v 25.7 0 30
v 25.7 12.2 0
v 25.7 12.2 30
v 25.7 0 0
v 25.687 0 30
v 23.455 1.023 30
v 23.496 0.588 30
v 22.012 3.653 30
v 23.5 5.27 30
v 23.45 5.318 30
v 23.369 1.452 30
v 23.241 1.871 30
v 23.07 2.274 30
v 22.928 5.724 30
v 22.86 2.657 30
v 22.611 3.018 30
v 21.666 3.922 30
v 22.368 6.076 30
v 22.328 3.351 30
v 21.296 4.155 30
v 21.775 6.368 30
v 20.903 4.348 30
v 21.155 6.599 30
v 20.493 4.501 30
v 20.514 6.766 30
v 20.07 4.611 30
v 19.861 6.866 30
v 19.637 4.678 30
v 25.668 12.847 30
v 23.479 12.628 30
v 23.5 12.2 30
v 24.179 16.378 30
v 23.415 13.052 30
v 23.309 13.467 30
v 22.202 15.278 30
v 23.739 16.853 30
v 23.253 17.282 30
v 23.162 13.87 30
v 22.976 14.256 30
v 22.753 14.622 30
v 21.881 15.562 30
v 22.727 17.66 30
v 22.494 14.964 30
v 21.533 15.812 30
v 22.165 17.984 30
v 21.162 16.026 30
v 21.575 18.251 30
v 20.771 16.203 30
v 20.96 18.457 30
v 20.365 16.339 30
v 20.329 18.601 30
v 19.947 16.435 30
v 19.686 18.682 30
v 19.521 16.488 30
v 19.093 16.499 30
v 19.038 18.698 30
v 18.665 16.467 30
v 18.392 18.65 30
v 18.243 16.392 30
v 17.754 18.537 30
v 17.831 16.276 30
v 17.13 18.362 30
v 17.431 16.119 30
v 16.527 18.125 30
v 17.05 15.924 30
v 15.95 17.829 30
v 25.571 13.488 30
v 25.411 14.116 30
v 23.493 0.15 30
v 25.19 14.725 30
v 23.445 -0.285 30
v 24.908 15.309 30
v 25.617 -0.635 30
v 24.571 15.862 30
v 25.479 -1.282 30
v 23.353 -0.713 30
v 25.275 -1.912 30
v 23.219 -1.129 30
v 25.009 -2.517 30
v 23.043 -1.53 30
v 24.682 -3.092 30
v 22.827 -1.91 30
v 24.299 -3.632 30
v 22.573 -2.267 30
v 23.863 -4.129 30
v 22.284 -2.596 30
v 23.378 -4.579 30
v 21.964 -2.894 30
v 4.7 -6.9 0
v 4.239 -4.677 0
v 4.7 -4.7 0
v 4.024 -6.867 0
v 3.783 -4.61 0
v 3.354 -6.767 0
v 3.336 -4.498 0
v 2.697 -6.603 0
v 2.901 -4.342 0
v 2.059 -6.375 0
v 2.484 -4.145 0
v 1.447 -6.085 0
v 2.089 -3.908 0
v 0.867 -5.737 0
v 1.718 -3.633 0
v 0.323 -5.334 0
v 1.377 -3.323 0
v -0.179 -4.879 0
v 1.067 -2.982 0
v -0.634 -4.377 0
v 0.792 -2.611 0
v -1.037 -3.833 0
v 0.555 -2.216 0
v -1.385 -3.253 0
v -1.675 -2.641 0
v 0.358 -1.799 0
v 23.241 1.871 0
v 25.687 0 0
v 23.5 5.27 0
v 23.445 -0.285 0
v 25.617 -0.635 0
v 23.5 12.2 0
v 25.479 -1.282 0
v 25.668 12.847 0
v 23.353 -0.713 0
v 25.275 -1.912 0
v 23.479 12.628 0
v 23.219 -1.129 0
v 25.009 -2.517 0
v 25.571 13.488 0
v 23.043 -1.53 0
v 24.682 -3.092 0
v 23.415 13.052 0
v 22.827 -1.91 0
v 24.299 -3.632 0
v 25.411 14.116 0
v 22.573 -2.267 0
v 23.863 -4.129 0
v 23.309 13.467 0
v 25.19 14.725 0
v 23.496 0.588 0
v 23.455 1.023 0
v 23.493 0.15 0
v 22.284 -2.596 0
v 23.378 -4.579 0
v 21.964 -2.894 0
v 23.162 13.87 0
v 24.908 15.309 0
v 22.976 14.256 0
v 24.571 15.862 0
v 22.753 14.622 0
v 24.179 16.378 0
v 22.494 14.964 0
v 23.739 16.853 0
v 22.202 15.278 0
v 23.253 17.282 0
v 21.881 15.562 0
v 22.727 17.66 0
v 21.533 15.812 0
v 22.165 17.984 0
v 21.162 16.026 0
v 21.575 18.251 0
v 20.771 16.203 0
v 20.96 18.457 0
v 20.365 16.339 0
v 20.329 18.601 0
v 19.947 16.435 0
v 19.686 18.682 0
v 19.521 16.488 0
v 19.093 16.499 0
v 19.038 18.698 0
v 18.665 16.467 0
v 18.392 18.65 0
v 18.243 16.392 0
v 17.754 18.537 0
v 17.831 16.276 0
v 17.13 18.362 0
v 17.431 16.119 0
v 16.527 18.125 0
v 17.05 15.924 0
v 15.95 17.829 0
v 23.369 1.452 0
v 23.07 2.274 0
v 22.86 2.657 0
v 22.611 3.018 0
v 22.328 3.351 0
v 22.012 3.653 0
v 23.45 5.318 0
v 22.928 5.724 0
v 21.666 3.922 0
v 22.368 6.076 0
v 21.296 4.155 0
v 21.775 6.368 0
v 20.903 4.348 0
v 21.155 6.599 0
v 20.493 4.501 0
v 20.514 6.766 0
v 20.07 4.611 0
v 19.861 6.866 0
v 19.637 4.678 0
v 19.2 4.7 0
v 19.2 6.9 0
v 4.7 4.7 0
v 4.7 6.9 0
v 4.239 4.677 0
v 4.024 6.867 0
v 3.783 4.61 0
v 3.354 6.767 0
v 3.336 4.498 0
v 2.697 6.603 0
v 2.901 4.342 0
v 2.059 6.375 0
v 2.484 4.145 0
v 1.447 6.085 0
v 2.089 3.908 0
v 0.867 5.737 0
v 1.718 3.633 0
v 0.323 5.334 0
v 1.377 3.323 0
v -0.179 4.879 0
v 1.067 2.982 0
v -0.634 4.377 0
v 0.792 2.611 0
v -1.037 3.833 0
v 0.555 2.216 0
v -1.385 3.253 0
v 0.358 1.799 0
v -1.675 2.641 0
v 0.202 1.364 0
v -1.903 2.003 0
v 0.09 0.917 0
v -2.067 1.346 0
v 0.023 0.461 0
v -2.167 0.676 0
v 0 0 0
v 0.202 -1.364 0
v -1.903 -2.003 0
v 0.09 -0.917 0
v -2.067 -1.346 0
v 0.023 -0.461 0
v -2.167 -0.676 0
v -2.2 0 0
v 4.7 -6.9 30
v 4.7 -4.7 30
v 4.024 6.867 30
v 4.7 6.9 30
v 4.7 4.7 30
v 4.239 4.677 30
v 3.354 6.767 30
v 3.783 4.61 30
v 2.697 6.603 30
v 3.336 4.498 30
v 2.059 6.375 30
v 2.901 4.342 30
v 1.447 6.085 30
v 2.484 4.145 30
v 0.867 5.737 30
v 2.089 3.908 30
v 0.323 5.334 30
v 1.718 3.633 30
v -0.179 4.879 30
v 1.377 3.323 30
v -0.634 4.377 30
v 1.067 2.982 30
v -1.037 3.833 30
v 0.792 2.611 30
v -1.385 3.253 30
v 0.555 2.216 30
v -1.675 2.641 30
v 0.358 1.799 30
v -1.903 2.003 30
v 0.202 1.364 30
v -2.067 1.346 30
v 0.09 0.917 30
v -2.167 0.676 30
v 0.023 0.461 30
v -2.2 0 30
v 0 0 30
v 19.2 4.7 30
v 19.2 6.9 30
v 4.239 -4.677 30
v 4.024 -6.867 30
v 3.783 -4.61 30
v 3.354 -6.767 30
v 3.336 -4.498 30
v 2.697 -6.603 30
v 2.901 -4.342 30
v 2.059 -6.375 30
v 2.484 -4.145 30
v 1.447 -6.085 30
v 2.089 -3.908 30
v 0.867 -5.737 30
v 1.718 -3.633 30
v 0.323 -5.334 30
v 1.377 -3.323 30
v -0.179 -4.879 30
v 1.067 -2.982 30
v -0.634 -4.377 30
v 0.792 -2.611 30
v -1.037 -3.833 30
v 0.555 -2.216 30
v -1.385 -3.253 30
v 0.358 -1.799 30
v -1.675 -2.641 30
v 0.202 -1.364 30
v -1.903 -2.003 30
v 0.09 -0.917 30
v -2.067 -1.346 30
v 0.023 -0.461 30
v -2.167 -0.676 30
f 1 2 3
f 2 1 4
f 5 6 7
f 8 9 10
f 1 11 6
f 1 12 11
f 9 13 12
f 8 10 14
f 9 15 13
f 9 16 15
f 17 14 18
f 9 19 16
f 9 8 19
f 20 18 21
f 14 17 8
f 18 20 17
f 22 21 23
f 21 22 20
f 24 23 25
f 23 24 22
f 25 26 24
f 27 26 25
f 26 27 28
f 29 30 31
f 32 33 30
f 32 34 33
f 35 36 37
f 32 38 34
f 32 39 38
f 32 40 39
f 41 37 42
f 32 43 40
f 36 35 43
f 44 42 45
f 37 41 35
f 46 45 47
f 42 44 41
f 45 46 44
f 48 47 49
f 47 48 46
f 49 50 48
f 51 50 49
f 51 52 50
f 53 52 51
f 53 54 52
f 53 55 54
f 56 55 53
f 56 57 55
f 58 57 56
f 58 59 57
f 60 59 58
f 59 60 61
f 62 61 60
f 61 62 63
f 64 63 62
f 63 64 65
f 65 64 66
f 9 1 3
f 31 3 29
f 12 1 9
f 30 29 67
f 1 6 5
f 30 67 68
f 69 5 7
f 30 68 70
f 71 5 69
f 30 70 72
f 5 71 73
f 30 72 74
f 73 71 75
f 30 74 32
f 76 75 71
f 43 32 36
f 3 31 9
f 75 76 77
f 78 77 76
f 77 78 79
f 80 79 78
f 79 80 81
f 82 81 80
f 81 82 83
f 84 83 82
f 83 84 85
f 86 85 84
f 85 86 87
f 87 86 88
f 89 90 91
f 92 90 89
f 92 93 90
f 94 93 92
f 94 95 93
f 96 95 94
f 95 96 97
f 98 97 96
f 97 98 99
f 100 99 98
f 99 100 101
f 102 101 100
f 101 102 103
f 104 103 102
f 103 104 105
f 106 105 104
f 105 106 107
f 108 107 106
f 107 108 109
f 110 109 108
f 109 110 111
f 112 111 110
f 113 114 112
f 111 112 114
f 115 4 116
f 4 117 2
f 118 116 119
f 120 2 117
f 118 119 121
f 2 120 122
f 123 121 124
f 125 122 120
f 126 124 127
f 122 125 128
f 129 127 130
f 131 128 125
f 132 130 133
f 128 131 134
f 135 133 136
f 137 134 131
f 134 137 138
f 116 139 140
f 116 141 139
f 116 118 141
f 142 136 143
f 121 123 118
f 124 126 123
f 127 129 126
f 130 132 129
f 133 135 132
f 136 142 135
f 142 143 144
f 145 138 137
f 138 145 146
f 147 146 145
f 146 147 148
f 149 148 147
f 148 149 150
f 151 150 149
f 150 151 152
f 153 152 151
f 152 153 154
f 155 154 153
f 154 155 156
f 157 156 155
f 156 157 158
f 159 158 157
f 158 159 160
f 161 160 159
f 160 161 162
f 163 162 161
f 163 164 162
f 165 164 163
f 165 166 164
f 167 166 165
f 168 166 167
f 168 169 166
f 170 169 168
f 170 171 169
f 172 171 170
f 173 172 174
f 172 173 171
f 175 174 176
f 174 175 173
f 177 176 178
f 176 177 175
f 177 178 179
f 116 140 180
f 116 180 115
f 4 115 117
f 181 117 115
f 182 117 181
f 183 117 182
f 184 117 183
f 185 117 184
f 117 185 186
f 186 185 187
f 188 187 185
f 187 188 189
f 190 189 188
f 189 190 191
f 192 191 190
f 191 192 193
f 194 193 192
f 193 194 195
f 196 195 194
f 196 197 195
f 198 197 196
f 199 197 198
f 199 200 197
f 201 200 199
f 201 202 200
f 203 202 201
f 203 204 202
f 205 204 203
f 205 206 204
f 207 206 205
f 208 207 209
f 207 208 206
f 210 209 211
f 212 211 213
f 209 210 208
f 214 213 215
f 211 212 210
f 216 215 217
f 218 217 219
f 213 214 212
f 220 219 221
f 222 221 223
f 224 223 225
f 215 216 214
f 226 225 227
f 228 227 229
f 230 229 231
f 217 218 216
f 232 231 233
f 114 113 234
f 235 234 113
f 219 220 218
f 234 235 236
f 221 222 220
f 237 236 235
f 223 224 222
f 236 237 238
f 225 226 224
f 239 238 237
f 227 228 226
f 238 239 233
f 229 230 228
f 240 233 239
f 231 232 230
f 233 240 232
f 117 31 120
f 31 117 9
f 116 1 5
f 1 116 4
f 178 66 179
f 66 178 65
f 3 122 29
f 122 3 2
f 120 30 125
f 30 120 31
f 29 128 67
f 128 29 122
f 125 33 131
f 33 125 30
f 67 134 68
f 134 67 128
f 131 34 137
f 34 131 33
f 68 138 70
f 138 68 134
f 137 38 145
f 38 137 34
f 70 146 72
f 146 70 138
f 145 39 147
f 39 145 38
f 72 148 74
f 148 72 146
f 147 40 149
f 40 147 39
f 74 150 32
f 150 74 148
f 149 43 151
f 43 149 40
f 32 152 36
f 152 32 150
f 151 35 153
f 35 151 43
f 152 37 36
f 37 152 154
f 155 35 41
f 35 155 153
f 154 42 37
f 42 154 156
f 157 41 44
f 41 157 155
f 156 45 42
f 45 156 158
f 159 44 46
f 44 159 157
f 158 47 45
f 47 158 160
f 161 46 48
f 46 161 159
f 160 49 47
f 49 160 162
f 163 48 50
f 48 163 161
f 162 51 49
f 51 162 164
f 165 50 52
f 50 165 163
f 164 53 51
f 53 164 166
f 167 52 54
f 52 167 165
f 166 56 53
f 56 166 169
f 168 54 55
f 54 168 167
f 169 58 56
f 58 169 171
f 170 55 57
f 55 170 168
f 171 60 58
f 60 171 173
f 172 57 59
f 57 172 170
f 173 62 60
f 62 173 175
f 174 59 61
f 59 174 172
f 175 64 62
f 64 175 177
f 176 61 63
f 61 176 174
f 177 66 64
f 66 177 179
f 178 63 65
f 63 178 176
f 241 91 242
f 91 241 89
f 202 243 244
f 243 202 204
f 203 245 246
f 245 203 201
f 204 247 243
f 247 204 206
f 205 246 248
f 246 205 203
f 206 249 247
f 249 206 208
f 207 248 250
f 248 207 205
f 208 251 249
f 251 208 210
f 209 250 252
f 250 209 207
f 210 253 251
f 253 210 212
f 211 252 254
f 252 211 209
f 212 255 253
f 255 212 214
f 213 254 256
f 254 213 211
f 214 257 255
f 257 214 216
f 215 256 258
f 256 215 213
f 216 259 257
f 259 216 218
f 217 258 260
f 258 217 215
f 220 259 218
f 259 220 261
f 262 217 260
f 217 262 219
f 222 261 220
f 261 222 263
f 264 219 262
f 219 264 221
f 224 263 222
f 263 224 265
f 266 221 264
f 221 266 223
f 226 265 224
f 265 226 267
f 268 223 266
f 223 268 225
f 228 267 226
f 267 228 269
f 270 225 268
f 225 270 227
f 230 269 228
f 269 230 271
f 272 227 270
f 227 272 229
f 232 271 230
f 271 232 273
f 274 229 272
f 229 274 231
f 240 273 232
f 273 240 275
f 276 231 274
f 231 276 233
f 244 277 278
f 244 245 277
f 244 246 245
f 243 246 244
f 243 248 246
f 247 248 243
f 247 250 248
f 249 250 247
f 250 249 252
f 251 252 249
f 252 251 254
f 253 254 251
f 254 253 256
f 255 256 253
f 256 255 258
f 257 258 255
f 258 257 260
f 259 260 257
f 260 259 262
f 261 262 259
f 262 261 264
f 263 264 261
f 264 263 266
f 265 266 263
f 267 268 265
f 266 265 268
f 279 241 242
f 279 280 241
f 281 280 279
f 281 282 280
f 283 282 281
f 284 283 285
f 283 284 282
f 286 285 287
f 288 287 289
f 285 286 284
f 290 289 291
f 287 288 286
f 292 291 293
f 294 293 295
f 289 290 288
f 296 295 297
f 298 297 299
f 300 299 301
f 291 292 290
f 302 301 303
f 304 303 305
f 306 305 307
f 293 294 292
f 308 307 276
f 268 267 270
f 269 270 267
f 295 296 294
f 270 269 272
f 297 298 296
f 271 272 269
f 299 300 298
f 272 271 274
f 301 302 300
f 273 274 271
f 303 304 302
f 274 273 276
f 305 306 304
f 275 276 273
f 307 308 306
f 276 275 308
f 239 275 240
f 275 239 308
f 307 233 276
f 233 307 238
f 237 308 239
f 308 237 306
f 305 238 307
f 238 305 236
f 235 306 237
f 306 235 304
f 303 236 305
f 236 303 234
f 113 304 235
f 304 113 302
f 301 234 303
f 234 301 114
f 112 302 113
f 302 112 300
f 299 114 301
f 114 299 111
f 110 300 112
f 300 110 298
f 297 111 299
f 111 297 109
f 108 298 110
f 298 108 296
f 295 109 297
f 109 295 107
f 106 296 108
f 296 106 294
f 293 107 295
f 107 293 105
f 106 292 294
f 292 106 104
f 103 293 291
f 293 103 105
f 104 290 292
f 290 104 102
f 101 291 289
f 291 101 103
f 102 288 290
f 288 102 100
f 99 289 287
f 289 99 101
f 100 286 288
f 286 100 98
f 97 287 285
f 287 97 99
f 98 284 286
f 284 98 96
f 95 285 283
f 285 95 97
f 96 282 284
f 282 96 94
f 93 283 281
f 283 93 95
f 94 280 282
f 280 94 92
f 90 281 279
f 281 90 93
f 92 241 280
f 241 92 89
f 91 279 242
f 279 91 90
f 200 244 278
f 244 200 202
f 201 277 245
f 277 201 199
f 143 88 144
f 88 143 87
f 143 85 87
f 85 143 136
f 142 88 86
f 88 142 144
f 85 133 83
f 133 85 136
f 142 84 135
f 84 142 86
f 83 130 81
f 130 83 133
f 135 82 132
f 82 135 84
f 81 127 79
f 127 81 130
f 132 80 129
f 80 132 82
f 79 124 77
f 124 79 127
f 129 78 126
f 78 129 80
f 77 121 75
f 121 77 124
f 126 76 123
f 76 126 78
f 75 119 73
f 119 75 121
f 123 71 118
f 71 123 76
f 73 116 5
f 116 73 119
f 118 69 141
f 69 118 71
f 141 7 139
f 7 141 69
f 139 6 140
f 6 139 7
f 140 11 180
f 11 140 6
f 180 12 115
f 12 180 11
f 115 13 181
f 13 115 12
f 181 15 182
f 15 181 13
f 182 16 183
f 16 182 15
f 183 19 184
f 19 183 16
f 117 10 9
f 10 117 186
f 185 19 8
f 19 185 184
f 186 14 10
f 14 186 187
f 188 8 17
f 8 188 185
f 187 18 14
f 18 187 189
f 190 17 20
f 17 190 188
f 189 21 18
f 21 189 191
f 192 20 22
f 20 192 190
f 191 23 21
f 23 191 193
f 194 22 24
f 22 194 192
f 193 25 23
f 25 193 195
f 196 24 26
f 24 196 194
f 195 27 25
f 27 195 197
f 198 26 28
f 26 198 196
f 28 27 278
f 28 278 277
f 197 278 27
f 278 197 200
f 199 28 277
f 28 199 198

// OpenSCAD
/* Copyleft Roy Sigurd Karlsbakk <roy@karlsbakk.net> 2019
 * Dings for å ersatatte drit fra Plantasjen
 *
 * Lisens  CC BY-NC https://creativecommons.org/licenses/by-nc/4.0/legalcode.no
 * License CC BY-NC https://creativecommons.org/licenses/by-nc/4.0/legalcode
 */

$fn=64;

/*
 * Arguments accepted
 *
 * 'radius'      Inner radius
 * 'diameter'    Not accepted - use radius
 * 'thickness'   Thickness of ring - outer radius = radius+thickness
 * 'height'      Height or width depending on view - height before rotating
 * 'angle'       Angle of arc to draw, 360 being a full circle
 *
 */
module skalk(radius, thickness, height, angle=360) {
    rotate_extrude(convexity = 10, angle=angle)
        translate([radius, 0, 0])
        square([thickness,height]);
}

tykkelse=2.2;
radius=4.7;
radius2=4.3;
//lengde=21.4-radius-radius2;
//lengde=21.7-radius-radius2;
//lengde=22-radius-radius2;
lengde=23.5-radius-radius2;
hoyde=30;

translate([radius,0,0]) {
    rotate([0,0,90])
        skalk(radius=radius, height=hoyde, thickness=tykkelse, angle=180);
    translate([0,radius,0]) {
        cube([lengde,tykkelse,hoyde]);
    }
    translate([lengde,radius-radius2,0])
        rotate([0,0,310])
            skalk(radius=radius2, height=hoyde, thickness=tykkelse, angle=140);
    translate([lengde+radius2,0,0]) {
        cube([tykkelse,tykkelse+10,hoyde]);
        translate([-radius2,tykkelse+10,0])
            skalk(radius=radius2, height=hoyde, thickness=tykkelse, angle=120);
    }
}
